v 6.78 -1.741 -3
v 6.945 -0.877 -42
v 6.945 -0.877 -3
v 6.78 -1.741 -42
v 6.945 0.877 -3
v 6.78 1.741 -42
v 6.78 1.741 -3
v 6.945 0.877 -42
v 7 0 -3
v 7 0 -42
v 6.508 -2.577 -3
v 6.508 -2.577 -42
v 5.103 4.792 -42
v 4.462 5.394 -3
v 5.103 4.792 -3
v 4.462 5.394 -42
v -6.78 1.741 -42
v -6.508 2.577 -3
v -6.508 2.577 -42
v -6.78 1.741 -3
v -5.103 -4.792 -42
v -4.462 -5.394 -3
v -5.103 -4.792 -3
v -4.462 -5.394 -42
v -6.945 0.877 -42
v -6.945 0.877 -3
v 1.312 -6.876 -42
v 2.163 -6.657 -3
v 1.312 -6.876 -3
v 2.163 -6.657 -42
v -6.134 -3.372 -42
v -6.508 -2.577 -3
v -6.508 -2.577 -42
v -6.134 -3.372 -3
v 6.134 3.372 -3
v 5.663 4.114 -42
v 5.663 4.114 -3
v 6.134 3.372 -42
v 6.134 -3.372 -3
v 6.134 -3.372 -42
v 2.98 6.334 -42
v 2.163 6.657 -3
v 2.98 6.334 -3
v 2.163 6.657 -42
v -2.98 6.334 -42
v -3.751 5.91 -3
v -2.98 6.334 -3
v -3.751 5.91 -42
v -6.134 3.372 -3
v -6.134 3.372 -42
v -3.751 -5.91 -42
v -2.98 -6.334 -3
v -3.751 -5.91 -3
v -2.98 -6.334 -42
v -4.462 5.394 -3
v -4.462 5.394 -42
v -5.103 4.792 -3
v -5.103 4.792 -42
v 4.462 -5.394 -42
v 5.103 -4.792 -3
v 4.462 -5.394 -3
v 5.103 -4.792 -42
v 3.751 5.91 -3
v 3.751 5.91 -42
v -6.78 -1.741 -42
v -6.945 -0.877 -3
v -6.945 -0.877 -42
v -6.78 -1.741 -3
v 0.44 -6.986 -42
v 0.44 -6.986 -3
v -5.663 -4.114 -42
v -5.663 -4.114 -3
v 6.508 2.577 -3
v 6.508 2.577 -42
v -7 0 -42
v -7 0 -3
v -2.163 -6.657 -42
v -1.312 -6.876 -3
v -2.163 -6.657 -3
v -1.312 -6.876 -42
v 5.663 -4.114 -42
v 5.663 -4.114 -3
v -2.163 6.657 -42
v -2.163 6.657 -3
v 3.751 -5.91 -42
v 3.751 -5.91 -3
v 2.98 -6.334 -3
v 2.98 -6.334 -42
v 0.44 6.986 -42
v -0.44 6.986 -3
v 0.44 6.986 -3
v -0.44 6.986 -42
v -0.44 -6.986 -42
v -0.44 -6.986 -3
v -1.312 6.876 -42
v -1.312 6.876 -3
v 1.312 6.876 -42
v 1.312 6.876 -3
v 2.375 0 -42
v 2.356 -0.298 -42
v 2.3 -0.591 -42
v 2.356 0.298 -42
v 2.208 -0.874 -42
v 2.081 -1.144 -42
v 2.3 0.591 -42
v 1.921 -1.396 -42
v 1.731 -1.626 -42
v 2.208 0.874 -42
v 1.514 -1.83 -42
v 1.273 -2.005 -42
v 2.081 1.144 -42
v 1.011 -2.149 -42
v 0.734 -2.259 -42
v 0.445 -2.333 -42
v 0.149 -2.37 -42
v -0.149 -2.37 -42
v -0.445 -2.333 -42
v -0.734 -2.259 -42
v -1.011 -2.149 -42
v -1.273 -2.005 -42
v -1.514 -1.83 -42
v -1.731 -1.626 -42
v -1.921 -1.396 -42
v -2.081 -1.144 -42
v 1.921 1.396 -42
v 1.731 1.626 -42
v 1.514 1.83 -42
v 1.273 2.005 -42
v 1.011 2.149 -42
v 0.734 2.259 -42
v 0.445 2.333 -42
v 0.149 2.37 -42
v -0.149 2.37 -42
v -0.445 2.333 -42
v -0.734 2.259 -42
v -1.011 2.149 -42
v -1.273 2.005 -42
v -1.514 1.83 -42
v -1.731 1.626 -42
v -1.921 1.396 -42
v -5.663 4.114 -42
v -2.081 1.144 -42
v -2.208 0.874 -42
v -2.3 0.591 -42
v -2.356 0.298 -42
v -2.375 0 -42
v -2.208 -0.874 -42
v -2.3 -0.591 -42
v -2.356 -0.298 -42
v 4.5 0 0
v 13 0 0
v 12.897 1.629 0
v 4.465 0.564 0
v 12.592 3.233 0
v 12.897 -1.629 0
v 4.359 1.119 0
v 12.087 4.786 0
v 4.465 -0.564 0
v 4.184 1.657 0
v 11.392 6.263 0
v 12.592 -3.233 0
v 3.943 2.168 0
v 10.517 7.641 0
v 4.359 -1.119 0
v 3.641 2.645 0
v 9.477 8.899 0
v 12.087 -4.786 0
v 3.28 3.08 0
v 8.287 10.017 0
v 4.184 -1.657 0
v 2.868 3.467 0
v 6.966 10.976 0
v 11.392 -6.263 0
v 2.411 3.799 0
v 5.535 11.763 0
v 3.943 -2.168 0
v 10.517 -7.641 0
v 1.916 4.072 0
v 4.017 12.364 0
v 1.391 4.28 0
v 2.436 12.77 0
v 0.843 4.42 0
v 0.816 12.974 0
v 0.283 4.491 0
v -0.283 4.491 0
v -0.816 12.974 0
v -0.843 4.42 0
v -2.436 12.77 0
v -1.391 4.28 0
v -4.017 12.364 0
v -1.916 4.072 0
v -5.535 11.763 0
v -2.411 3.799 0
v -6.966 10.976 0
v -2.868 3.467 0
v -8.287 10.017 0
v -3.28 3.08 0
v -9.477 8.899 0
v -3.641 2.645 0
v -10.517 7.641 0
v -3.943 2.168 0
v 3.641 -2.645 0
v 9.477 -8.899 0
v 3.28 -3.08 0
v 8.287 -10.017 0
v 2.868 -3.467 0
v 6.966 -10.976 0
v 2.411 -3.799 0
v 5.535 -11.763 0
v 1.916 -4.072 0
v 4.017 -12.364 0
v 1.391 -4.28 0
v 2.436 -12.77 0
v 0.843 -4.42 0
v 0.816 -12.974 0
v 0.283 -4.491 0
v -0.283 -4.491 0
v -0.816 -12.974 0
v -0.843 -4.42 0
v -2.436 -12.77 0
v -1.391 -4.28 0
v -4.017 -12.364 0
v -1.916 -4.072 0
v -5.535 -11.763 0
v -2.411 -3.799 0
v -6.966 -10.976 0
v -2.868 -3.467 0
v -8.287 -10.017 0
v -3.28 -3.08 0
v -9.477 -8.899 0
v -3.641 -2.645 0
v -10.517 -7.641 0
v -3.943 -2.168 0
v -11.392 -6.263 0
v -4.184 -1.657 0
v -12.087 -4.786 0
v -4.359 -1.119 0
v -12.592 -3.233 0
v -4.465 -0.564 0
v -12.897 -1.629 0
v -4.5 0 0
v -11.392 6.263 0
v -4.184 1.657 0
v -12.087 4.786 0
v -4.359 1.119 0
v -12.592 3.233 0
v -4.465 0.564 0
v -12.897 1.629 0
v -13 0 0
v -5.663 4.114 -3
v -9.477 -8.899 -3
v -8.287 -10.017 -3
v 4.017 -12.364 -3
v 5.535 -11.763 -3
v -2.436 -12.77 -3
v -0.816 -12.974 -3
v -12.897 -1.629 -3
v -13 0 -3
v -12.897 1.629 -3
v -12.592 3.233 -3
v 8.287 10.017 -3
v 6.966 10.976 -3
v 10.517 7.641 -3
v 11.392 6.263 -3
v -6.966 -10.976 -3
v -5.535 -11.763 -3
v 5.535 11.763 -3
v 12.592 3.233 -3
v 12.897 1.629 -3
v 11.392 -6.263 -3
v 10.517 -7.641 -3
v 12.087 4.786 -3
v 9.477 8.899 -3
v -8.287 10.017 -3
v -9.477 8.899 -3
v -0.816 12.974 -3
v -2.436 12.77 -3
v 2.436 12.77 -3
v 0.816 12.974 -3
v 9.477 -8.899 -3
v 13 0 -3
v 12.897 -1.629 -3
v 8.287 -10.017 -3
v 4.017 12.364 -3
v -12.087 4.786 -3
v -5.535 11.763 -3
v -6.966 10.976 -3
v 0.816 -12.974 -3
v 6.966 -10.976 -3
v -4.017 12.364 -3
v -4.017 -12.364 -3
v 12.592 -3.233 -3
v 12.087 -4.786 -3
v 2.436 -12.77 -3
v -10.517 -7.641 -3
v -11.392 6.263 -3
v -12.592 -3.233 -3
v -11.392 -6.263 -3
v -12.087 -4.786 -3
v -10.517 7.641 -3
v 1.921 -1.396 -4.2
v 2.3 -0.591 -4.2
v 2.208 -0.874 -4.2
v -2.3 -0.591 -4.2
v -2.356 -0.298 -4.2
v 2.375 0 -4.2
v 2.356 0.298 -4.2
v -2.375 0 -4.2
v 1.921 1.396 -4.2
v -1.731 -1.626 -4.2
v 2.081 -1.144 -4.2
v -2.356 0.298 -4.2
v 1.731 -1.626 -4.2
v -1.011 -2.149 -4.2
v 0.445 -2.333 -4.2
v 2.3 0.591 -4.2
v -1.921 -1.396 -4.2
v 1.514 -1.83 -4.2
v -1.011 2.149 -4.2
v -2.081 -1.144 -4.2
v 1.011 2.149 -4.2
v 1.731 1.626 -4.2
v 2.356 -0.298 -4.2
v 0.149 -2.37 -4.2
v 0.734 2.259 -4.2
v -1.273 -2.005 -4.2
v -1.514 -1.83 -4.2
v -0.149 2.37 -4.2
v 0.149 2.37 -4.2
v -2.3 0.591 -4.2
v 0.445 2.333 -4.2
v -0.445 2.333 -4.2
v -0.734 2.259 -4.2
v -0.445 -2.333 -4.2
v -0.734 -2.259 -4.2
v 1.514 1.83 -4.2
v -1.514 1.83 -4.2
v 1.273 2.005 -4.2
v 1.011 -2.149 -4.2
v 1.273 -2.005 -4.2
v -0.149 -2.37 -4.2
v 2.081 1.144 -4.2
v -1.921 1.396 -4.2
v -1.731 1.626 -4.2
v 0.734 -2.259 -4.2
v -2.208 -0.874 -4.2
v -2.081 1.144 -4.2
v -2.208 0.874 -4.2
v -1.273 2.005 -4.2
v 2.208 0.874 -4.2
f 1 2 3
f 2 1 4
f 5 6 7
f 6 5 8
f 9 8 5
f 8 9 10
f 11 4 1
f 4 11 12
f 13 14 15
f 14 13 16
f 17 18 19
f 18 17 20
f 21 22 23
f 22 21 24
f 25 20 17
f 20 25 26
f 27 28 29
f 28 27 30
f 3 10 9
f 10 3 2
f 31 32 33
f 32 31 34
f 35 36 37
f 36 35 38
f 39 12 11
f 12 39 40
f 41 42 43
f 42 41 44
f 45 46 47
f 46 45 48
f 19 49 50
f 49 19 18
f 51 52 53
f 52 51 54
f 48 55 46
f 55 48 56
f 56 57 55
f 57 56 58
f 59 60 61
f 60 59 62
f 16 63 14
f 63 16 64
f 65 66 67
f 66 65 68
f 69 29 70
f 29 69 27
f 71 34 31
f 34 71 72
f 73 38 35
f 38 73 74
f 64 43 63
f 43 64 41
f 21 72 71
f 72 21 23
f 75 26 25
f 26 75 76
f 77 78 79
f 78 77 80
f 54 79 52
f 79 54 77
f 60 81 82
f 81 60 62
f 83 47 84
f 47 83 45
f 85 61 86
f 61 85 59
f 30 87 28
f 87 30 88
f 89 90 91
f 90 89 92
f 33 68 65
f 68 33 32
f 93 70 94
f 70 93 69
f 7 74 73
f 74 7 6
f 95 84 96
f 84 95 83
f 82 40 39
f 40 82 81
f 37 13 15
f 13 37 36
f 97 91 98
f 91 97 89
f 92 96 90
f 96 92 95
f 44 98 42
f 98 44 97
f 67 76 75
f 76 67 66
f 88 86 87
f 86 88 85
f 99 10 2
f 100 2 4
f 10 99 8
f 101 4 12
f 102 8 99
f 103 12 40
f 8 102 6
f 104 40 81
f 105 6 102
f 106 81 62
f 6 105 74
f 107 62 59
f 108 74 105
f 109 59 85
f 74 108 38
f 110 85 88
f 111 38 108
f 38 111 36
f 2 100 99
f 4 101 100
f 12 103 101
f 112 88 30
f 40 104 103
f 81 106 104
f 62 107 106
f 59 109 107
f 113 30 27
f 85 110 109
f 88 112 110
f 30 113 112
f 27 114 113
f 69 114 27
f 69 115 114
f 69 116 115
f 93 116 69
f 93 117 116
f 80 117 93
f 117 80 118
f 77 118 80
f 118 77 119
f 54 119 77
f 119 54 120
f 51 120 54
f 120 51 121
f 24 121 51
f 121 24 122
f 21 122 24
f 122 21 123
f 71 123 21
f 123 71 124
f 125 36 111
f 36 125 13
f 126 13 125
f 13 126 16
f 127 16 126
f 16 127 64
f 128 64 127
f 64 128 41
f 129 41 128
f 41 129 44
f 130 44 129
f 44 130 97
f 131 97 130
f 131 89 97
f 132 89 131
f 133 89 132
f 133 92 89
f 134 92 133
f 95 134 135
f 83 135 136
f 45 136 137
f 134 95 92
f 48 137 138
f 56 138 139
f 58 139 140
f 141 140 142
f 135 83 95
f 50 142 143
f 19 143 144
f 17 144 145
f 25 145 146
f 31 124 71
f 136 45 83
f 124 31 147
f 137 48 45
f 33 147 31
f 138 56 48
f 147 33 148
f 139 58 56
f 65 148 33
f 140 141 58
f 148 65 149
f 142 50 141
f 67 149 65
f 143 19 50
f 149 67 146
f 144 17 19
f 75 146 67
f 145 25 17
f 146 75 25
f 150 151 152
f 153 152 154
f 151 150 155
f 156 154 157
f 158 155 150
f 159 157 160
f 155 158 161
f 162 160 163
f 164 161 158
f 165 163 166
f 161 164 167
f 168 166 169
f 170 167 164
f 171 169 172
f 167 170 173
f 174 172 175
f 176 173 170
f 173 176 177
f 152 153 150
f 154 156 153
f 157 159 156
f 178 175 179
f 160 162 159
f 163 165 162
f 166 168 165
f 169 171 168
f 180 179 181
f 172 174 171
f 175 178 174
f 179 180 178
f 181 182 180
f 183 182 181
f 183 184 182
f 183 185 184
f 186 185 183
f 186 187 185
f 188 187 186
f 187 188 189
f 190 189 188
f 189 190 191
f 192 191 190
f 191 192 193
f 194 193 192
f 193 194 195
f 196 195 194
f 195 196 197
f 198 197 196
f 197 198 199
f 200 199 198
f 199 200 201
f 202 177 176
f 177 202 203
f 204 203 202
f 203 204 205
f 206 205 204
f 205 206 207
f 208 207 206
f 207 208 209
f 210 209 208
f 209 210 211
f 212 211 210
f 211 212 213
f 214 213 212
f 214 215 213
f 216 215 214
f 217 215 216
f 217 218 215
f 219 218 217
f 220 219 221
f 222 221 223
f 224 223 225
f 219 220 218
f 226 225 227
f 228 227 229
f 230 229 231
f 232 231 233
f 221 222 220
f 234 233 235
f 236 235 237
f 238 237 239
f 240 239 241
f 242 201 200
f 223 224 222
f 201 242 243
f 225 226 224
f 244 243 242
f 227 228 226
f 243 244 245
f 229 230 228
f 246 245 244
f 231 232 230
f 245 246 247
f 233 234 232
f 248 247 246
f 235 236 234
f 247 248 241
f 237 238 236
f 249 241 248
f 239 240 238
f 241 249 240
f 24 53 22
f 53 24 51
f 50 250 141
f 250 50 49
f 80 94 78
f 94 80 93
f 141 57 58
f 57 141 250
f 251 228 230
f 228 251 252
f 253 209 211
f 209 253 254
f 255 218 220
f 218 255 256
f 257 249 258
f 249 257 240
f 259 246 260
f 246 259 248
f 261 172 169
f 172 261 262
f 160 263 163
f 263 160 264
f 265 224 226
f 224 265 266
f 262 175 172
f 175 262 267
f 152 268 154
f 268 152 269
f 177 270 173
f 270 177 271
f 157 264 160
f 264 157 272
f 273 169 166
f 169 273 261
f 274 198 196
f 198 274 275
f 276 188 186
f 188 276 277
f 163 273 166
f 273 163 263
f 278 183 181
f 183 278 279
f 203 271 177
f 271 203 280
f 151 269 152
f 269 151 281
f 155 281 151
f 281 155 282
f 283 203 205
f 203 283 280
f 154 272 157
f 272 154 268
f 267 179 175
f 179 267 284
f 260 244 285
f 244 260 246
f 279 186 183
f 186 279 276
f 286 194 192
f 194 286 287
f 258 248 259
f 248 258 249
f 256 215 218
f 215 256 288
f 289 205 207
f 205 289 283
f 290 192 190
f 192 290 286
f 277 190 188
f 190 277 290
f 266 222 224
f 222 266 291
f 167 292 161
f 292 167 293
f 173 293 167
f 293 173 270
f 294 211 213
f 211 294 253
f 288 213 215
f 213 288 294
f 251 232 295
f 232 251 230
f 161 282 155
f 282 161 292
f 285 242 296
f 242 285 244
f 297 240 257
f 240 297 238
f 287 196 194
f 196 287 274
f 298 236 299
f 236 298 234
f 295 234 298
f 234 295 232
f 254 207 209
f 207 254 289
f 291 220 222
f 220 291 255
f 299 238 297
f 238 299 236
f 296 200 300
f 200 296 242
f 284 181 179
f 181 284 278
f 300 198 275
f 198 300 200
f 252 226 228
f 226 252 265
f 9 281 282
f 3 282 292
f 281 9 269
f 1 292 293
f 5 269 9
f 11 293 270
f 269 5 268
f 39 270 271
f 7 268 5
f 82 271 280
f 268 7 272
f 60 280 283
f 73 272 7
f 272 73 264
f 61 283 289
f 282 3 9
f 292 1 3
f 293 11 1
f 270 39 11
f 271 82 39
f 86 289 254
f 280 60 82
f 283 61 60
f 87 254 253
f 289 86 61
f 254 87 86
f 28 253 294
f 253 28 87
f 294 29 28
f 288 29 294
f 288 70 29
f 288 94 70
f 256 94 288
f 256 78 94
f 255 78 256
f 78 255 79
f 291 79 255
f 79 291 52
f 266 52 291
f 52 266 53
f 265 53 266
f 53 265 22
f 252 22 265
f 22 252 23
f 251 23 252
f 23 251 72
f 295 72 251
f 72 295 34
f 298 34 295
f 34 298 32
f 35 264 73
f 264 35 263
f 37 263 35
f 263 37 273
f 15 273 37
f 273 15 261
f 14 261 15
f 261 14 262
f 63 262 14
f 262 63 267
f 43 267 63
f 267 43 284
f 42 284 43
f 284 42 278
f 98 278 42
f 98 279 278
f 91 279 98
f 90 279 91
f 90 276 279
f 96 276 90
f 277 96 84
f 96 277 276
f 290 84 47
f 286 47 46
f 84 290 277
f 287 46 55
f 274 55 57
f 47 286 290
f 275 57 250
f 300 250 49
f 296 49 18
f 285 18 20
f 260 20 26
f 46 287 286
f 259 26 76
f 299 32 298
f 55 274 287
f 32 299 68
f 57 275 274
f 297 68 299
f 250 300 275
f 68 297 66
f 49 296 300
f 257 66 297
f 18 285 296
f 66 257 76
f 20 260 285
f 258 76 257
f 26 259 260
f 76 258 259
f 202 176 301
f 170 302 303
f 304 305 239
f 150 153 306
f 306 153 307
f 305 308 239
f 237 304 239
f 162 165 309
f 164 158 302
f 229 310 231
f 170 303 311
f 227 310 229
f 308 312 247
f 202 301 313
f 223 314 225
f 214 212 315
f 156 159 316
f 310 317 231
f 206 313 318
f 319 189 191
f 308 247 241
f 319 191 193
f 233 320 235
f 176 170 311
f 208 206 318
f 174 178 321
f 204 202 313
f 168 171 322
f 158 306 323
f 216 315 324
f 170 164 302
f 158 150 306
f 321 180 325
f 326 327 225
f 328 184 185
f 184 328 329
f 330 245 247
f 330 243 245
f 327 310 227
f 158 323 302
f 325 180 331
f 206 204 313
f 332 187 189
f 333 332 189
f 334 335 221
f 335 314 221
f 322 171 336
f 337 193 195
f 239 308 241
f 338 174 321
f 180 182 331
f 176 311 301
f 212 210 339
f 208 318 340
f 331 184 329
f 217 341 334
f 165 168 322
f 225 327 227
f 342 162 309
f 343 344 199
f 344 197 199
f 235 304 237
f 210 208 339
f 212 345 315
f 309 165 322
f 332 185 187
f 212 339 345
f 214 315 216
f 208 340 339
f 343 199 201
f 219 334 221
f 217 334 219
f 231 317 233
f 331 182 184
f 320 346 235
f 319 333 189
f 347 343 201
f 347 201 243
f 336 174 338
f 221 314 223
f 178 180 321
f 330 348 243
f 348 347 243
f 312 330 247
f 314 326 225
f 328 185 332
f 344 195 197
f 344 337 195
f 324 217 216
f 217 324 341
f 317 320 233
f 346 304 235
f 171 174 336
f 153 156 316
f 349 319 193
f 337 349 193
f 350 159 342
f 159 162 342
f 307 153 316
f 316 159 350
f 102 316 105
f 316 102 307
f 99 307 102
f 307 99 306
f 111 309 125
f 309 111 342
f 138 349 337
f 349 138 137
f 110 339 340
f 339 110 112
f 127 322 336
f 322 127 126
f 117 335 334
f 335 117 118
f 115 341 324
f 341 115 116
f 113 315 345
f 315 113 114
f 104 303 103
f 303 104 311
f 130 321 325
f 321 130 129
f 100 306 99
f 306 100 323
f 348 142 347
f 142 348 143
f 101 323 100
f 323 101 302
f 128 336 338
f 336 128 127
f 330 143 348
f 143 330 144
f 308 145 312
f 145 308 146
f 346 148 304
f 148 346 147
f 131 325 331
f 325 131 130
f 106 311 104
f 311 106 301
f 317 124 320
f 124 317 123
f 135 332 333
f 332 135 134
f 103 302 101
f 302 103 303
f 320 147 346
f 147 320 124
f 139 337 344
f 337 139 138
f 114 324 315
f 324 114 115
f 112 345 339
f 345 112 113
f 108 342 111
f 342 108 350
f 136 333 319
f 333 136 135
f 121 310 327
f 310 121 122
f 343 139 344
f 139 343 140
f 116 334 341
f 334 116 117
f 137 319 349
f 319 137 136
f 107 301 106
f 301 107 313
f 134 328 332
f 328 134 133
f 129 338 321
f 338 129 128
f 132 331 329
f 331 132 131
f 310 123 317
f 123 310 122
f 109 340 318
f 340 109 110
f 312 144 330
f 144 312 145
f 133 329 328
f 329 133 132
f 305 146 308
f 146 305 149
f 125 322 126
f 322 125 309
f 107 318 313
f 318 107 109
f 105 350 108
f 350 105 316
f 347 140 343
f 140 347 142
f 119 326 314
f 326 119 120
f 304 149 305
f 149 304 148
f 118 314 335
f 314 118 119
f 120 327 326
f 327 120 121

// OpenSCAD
$fn = 50;


difference() {
	union() {
		translate(v = [0, 0, -42.0000000000]) {
			cylinder(h = 42, r = 7.0000000000);
		}
		translate(v = [0, 0, -3.0000000000]) {
			cylinder(h = 3, r = 13.0000000000);
		}
	}
	union() {
		translate(v = [0, 0, 0]) {
			rotate(a = [0, 0, 0]) {
				difference() {
					union() {
						#translate(v = [0, 0, -42.0000000000]) {
							cylinder(h = 42, r = 2.2500000000);
						}
						#translate(v = [0, 0, -4.2000000000]) {
							cylinder(h = 4.2000000000, r = 7.0000000000, r1 = 2.3750000000, r2 = 4.5000000000);
						}
						#translate(v = [0, 0, -42.0000000000]) {
							cylinder(h = 42, r = 2.3750000000);
						}
						#translate(v = [0, 0, -42.0000000000]) {
							cylinder(h = 42, r = 2.2500000000);
						}
					}
					union();
				}
			}
		}
	}
}
